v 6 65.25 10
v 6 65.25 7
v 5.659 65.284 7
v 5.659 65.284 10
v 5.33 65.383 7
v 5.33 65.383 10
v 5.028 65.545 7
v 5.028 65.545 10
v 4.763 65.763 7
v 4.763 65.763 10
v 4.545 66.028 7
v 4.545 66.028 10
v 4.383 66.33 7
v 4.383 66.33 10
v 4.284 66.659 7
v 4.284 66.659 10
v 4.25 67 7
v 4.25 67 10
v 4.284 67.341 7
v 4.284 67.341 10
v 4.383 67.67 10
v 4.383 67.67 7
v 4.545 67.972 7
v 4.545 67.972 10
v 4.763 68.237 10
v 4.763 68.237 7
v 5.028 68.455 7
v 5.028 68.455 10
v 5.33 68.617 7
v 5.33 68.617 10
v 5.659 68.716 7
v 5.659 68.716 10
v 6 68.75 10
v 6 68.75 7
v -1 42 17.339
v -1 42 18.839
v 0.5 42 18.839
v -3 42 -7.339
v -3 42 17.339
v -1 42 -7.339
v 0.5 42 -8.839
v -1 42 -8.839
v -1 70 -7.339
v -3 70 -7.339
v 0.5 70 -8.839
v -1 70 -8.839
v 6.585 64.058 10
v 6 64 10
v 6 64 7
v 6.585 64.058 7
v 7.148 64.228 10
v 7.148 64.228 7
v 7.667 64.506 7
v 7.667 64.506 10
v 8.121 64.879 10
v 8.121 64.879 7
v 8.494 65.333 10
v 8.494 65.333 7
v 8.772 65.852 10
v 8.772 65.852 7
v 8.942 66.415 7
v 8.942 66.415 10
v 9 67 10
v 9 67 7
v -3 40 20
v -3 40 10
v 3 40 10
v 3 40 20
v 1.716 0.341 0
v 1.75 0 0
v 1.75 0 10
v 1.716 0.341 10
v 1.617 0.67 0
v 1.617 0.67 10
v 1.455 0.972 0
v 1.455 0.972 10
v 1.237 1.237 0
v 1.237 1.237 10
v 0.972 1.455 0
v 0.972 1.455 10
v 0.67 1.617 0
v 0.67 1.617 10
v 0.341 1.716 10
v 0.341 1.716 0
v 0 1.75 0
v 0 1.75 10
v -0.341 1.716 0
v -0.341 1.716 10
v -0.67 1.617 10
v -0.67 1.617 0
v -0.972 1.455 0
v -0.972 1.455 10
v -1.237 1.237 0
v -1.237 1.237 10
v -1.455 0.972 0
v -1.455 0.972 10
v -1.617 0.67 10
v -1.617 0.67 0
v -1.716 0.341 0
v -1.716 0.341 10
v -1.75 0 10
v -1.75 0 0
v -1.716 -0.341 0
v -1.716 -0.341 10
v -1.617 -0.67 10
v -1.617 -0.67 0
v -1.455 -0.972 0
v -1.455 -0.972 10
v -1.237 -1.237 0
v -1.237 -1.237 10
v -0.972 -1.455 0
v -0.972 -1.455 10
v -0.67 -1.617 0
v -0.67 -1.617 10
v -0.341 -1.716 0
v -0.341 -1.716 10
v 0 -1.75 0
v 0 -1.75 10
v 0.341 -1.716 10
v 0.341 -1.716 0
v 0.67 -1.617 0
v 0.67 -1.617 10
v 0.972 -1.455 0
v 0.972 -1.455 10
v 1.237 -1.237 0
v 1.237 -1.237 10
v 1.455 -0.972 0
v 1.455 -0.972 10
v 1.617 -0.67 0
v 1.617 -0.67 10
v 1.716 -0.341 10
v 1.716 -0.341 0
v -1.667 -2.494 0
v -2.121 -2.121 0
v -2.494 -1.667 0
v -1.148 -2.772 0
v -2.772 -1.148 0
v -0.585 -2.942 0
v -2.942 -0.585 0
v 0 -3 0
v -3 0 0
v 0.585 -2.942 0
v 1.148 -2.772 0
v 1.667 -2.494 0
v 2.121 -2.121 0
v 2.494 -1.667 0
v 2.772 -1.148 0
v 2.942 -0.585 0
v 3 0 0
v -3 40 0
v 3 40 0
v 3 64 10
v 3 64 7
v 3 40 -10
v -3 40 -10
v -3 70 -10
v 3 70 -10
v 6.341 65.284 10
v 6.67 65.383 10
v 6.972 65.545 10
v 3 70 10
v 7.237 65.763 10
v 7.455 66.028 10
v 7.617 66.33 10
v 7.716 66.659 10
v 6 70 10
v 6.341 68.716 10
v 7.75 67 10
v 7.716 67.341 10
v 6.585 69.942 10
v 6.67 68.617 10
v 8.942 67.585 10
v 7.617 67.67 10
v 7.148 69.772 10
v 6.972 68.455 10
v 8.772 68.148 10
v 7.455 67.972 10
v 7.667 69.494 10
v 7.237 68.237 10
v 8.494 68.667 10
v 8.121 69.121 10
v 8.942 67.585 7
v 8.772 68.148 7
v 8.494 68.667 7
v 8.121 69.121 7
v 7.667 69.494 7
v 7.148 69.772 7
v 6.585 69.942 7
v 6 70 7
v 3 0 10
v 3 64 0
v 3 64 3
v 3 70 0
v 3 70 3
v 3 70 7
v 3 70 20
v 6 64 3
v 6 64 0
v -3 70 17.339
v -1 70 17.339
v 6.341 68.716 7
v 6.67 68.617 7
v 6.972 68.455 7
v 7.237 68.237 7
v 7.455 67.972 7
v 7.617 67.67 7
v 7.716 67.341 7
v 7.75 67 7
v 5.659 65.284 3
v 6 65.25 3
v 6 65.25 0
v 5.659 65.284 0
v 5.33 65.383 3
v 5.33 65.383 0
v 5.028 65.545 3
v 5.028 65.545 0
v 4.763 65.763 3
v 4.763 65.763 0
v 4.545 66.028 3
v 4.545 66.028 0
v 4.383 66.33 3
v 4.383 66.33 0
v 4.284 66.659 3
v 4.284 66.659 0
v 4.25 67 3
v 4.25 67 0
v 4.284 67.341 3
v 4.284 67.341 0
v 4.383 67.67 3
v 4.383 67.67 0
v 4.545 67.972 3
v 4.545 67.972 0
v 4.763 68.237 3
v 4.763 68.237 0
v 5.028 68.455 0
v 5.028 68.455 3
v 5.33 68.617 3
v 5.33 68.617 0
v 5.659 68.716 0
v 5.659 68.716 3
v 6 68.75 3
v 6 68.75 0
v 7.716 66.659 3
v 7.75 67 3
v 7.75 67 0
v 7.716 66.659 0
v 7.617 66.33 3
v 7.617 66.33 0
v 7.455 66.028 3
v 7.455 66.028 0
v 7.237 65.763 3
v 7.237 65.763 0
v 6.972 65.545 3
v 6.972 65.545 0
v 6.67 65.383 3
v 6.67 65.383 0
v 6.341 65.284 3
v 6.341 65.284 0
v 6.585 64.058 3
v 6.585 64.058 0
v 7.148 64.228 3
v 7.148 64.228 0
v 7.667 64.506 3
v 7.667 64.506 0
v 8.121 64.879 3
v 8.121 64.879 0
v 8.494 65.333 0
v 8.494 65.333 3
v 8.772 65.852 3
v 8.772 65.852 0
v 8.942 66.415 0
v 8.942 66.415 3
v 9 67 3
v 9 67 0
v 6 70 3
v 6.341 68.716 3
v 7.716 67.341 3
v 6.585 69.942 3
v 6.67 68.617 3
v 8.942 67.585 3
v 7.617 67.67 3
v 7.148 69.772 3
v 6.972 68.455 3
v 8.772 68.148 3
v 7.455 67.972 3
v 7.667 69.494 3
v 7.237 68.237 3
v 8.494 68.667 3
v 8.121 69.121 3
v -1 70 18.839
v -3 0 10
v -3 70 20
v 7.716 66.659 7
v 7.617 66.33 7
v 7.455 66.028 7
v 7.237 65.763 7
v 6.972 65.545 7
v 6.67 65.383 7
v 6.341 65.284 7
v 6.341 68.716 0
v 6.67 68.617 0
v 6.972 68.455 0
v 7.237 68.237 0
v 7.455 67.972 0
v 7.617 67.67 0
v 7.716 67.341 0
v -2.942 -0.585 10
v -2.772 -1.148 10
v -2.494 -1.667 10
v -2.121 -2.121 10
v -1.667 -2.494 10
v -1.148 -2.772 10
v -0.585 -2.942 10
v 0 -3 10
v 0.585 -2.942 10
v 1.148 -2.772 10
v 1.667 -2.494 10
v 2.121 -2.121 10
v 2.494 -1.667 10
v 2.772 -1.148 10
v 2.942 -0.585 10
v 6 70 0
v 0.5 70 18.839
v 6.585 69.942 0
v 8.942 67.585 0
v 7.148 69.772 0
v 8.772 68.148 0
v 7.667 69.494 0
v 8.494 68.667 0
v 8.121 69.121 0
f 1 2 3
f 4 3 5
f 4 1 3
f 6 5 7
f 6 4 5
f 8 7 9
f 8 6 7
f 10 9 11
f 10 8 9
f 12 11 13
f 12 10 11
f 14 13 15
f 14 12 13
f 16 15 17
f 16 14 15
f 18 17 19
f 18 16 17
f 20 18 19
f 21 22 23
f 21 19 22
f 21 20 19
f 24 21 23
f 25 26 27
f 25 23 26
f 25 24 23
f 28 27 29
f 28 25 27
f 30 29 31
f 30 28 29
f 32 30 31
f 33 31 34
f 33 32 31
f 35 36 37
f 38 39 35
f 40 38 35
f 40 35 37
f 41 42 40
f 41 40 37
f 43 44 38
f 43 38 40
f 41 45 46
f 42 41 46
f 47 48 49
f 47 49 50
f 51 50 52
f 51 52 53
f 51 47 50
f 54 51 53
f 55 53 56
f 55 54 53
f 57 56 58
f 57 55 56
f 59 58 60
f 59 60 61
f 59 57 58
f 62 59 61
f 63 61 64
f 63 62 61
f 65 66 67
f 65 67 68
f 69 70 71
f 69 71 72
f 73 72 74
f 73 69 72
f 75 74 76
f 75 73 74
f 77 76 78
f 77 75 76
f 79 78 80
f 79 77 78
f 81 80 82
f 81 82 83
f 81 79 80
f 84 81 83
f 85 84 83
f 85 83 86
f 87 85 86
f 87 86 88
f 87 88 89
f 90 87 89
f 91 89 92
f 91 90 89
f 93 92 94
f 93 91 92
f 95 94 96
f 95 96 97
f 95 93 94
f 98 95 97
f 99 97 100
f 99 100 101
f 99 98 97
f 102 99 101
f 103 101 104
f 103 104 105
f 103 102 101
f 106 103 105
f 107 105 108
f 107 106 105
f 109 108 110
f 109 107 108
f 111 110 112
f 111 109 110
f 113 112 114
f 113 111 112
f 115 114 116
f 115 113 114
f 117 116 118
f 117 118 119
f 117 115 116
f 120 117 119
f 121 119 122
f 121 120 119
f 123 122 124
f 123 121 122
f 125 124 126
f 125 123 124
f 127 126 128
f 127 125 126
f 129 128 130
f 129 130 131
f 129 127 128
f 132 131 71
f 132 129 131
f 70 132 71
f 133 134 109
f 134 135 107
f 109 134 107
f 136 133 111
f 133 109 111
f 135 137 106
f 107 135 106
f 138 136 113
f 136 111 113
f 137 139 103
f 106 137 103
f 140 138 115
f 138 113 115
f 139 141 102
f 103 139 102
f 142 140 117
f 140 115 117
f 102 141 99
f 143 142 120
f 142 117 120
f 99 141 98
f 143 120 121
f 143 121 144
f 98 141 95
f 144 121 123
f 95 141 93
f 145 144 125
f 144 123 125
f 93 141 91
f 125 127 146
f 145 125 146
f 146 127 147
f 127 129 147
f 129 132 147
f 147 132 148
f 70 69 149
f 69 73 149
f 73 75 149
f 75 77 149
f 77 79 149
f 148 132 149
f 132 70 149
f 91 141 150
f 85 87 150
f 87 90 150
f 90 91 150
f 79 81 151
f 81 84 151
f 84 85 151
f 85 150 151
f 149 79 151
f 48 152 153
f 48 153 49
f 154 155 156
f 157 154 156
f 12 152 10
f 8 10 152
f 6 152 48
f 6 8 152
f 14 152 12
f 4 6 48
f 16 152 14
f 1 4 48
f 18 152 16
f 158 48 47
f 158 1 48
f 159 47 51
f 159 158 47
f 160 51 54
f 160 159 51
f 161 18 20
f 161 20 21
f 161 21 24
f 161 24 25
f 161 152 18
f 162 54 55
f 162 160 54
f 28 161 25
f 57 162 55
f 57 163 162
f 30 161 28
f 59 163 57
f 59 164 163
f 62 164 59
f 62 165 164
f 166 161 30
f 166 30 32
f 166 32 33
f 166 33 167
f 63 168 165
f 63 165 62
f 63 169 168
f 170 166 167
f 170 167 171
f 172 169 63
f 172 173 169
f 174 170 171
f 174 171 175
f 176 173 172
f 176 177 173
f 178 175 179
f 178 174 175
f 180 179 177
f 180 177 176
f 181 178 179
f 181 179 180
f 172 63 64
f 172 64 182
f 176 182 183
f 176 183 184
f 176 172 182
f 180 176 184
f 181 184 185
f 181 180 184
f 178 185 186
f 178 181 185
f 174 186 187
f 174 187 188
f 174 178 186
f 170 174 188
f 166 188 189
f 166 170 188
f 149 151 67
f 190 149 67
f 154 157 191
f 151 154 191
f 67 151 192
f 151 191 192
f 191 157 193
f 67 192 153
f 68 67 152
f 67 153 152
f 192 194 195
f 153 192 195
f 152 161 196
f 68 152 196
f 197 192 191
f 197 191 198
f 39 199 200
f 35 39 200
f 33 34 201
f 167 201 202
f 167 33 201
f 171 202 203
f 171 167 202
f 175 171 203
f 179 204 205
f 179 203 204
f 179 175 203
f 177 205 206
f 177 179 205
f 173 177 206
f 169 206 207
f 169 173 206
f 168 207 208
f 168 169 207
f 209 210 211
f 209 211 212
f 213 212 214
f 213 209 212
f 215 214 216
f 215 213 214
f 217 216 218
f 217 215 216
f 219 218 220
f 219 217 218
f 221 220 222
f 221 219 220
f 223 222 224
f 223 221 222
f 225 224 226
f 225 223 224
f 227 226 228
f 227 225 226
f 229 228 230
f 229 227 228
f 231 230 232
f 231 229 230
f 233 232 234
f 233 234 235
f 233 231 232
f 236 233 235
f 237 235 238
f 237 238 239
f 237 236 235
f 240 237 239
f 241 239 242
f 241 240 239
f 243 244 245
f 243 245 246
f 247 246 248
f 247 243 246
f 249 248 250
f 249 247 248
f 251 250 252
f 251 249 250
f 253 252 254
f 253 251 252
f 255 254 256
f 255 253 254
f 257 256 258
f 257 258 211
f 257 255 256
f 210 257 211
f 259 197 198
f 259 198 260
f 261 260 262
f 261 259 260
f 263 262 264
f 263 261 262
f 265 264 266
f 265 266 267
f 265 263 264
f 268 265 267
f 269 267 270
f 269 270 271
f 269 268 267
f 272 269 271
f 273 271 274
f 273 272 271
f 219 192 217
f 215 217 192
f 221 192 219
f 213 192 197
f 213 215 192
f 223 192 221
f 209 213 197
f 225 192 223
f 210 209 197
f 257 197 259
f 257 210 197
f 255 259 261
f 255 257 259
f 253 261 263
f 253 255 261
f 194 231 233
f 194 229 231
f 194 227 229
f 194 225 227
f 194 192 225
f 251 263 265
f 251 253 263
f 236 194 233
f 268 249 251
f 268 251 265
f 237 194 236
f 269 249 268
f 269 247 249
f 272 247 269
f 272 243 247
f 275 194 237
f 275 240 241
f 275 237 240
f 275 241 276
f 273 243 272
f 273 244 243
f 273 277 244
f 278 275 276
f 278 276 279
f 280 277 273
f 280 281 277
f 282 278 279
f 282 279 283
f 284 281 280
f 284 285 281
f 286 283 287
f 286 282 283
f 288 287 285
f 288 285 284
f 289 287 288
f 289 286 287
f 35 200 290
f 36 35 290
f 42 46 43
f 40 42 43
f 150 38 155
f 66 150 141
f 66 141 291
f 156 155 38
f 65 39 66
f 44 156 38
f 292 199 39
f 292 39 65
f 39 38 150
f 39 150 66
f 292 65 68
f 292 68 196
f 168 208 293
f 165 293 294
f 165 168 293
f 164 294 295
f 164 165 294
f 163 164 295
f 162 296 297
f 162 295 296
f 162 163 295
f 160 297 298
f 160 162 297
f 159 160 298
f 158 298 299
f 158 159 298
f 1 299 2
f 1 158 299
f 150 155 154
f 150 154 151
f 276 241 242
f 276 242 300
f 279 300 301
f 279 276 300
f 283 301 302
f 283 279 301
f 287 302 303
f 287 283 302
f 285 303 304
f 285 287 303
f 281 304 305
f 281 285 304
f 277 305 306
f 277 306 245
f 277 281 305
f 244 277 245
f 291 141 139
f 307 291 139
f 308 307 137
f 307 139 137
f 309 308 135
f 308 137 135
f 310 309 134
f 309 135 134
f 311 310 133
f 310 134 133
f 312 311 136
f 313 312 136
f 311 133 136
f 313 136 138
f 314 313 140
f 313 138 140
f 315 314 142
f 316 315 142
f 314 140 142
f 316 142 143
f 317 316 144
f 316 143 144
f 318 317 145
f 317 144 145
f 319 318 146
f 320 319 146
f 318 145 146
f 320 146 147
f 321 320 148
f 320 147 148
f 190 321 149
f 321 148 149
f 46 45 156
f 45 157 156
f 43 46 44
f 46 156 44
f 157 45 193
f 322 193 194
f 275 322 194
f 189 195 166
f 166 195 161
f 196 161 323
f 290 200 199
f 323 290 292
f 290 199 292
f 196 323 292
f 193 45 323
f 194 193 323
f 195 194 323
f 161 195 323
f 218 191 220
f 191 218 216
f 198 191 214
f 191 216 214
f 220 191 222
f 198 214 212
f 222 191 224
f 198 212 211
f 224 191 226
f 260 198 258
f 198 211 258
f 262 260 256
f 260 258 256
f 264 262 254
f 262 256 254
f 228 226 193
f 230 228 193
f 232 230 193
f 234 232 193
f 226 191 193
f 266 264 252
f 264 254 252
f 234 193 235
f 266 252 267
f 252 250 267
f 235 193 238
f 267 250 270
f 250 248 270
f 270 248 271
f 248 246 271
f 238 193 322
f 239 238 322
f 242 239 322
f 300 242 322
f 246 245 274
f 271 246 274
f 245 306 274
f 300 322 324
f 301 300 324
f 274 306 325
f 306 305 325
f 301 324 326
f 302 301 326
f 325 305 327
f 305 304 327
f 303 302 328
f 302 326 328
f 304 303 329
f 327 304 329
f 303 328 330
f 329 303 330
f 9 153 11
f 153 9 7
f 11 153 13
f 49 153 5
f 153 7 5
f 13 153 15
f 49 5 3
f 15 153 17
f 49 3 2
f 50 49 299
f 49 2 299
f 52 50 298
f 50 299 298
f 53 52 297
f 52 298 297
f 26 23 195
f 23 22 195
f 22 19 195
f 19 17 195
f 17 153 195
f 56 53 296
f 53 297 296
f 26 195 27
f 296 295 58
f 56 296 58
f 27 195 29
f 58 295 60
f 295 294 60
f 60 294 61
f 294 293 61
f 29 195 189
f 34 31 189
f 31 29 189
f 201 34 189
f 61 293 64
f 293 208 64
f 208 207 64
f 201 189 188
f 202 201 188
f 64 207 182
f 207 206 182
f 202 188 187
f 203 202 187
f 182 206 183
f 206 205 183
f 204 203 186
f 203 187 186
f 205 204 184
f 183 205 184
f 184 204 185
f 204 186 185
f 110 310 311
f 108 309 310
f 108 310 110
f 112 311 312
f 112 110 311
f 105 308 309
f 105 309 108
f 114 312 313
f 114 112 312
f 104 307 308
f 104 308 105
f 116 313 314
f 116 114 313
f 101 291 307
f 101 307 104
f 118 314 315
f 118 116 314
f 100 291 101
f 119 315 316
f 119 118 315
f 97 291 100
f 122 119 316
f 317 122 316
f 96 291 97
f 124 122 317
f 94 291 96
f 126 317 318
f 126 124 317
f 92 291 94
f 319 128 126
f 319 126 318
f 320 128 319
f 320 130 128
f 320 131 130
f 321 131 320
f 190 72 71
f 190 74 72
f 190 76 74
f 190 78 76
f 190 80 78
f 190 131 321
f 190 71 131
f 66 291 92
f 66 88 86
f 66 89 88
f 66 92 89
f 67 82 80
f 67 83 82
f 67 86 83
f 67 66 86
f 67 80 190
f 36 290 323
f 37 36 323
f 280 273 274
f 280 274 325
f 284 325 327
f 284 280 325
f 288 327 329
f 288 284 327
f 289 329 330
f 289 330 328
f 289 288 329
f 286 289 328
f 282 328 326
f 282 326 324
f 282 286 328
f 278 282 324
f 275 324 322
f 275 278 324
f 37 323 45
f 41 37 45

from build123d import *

# Parameters (mm, degrees)
SKETCH1_R           = 1.75
BOSS_EXTRUDE1_DEPTH = 10
SKETCH2_W           = 30
SKETCH2_H           = 30
BOSS_EXTRUDE2_DEPTH = 6
SKETCH3_W           = 2
SKETCH3_H           = 24.678853852
CUT_EXTRUDE1_DEPTH  = 28
BOSS_EXTRUDE3_DEPTH = 10
SKETCH5_W           = 6
SKETCH5_H           = 4
CUT_EXTRUDE2_DEPTH  = 6


with BuildPart() as part:
    # Sketch1 → Boss-Extrude1 (new body)
    with BuildSketch(Plane.XY):
        with BuildLine():
            ThreePointArc((-3, 0), (0, -3), (3, 0))
            Line((3, 0), (3, 70))
            Line((3, 70), (-3, 70))
            Line((-3, 70), (-3, 0))
        make_face()
        Circle(SKETCH1_R, mode=Mode.SUBTRACT)
    extrude(amount=BOSS_EXTRUDE1_DEPTH)

    # Sketch2 → Boss-Extrude2 (add)
    with BuildSketch(Plane.ZY.offset(3)):
        with Locations((5, 55)):
            Rectangle(SKETCH2_W, SKETCH2_H)
    extrude(amount=-BOSS_EXTRUDE2_DEPTH)

    # Sketch3 → Cut-Extrude1 (cut)
    with BuildSketch(Plane(origin=(0, 70, 0), x_dir=(1, 0, 0), z_dir=(0, 1, 0))):
        with Locations((-2, -5)):
            Rectangle(SKETCH3_W, SKETCH3_H)
        Polygon((-1, 8.839426926), (-1, 7.339426926), (-1, -17.339426926), (-1, -18.839426926), (0.5, -18.839426926), (0.5, 8.839426926), align=None)
    extrude(amount=-CUT_EXTRUDE1_DEPTH, mode=Mode.SUBTRACT)

    # Sketch4 → Boss-Extrude3 (add)
    with BuildSketch(Plane.XY.offset(10)):
        with BuildLine():
            ThreePointArc((9, 67), (8.121320344, 69.121320344), (6, 70))
            Line((6, 70), (6, 68.75))
            ThreePointArc((6, 68.75), (7.237436867, 68.237436867), (7.75, 67))
            ThreePointArc((7.75, 67), (7.237436867, 65.762563133), (6, 65.25))
            Line((6, 65.25), (6, 64))
            ThreePointArc((6, 64), (8.121320344, 64.878679656), (9, 67))
        make_face()
        with BuildLine():
            Line((6, 68.75), (6, 70))
            ThreePointArc((6, 70), (3.878679658, 69.121320346), (3, 67.000000006))
            ThreePointArc((3, 67.000000006), (3.878679654, 64.878679658), (6, 64))
            Line((6, 64), (6, 65.25))
            ThreePointArc((6, 65.25), (4.25, 67), (6, 68.75))
        make_face()
        with BuildLine():
            ThreePointArc((3, 67.000000006), (3.878679658, 69.121320346), (6, 70))
            Line((6, 70), (3, 70))
            Line((3, 70), (3, 67.000000006))
        make_face()
        with BuildLine():
            ThreePointArc((6, 64), (3.878679654, 64.878679658), (3, 67.000000006))
            Line((3, 67.000000006), (3, 64))
            Line((3, 64), (6, 64))
        make_face()
    extrude(amount=-BOSS_EXTRUDE3_DEPTH)

    # Sketch5 → Cut-Extrude2 (cut)
    with BuildSketch(Plane(origin=(0, 70, 0), x_dir=(1, 0, 0), z_dir=(0, 1, 0))):
        with Locations((6, -5)):
            Rectangle(SKETCH5_W, SKETCH5_H)
    extrude(amount=-CUT_EXTRUDE2_DEPTH, mode=Mode.SUBTRACT)


solid = part.part
